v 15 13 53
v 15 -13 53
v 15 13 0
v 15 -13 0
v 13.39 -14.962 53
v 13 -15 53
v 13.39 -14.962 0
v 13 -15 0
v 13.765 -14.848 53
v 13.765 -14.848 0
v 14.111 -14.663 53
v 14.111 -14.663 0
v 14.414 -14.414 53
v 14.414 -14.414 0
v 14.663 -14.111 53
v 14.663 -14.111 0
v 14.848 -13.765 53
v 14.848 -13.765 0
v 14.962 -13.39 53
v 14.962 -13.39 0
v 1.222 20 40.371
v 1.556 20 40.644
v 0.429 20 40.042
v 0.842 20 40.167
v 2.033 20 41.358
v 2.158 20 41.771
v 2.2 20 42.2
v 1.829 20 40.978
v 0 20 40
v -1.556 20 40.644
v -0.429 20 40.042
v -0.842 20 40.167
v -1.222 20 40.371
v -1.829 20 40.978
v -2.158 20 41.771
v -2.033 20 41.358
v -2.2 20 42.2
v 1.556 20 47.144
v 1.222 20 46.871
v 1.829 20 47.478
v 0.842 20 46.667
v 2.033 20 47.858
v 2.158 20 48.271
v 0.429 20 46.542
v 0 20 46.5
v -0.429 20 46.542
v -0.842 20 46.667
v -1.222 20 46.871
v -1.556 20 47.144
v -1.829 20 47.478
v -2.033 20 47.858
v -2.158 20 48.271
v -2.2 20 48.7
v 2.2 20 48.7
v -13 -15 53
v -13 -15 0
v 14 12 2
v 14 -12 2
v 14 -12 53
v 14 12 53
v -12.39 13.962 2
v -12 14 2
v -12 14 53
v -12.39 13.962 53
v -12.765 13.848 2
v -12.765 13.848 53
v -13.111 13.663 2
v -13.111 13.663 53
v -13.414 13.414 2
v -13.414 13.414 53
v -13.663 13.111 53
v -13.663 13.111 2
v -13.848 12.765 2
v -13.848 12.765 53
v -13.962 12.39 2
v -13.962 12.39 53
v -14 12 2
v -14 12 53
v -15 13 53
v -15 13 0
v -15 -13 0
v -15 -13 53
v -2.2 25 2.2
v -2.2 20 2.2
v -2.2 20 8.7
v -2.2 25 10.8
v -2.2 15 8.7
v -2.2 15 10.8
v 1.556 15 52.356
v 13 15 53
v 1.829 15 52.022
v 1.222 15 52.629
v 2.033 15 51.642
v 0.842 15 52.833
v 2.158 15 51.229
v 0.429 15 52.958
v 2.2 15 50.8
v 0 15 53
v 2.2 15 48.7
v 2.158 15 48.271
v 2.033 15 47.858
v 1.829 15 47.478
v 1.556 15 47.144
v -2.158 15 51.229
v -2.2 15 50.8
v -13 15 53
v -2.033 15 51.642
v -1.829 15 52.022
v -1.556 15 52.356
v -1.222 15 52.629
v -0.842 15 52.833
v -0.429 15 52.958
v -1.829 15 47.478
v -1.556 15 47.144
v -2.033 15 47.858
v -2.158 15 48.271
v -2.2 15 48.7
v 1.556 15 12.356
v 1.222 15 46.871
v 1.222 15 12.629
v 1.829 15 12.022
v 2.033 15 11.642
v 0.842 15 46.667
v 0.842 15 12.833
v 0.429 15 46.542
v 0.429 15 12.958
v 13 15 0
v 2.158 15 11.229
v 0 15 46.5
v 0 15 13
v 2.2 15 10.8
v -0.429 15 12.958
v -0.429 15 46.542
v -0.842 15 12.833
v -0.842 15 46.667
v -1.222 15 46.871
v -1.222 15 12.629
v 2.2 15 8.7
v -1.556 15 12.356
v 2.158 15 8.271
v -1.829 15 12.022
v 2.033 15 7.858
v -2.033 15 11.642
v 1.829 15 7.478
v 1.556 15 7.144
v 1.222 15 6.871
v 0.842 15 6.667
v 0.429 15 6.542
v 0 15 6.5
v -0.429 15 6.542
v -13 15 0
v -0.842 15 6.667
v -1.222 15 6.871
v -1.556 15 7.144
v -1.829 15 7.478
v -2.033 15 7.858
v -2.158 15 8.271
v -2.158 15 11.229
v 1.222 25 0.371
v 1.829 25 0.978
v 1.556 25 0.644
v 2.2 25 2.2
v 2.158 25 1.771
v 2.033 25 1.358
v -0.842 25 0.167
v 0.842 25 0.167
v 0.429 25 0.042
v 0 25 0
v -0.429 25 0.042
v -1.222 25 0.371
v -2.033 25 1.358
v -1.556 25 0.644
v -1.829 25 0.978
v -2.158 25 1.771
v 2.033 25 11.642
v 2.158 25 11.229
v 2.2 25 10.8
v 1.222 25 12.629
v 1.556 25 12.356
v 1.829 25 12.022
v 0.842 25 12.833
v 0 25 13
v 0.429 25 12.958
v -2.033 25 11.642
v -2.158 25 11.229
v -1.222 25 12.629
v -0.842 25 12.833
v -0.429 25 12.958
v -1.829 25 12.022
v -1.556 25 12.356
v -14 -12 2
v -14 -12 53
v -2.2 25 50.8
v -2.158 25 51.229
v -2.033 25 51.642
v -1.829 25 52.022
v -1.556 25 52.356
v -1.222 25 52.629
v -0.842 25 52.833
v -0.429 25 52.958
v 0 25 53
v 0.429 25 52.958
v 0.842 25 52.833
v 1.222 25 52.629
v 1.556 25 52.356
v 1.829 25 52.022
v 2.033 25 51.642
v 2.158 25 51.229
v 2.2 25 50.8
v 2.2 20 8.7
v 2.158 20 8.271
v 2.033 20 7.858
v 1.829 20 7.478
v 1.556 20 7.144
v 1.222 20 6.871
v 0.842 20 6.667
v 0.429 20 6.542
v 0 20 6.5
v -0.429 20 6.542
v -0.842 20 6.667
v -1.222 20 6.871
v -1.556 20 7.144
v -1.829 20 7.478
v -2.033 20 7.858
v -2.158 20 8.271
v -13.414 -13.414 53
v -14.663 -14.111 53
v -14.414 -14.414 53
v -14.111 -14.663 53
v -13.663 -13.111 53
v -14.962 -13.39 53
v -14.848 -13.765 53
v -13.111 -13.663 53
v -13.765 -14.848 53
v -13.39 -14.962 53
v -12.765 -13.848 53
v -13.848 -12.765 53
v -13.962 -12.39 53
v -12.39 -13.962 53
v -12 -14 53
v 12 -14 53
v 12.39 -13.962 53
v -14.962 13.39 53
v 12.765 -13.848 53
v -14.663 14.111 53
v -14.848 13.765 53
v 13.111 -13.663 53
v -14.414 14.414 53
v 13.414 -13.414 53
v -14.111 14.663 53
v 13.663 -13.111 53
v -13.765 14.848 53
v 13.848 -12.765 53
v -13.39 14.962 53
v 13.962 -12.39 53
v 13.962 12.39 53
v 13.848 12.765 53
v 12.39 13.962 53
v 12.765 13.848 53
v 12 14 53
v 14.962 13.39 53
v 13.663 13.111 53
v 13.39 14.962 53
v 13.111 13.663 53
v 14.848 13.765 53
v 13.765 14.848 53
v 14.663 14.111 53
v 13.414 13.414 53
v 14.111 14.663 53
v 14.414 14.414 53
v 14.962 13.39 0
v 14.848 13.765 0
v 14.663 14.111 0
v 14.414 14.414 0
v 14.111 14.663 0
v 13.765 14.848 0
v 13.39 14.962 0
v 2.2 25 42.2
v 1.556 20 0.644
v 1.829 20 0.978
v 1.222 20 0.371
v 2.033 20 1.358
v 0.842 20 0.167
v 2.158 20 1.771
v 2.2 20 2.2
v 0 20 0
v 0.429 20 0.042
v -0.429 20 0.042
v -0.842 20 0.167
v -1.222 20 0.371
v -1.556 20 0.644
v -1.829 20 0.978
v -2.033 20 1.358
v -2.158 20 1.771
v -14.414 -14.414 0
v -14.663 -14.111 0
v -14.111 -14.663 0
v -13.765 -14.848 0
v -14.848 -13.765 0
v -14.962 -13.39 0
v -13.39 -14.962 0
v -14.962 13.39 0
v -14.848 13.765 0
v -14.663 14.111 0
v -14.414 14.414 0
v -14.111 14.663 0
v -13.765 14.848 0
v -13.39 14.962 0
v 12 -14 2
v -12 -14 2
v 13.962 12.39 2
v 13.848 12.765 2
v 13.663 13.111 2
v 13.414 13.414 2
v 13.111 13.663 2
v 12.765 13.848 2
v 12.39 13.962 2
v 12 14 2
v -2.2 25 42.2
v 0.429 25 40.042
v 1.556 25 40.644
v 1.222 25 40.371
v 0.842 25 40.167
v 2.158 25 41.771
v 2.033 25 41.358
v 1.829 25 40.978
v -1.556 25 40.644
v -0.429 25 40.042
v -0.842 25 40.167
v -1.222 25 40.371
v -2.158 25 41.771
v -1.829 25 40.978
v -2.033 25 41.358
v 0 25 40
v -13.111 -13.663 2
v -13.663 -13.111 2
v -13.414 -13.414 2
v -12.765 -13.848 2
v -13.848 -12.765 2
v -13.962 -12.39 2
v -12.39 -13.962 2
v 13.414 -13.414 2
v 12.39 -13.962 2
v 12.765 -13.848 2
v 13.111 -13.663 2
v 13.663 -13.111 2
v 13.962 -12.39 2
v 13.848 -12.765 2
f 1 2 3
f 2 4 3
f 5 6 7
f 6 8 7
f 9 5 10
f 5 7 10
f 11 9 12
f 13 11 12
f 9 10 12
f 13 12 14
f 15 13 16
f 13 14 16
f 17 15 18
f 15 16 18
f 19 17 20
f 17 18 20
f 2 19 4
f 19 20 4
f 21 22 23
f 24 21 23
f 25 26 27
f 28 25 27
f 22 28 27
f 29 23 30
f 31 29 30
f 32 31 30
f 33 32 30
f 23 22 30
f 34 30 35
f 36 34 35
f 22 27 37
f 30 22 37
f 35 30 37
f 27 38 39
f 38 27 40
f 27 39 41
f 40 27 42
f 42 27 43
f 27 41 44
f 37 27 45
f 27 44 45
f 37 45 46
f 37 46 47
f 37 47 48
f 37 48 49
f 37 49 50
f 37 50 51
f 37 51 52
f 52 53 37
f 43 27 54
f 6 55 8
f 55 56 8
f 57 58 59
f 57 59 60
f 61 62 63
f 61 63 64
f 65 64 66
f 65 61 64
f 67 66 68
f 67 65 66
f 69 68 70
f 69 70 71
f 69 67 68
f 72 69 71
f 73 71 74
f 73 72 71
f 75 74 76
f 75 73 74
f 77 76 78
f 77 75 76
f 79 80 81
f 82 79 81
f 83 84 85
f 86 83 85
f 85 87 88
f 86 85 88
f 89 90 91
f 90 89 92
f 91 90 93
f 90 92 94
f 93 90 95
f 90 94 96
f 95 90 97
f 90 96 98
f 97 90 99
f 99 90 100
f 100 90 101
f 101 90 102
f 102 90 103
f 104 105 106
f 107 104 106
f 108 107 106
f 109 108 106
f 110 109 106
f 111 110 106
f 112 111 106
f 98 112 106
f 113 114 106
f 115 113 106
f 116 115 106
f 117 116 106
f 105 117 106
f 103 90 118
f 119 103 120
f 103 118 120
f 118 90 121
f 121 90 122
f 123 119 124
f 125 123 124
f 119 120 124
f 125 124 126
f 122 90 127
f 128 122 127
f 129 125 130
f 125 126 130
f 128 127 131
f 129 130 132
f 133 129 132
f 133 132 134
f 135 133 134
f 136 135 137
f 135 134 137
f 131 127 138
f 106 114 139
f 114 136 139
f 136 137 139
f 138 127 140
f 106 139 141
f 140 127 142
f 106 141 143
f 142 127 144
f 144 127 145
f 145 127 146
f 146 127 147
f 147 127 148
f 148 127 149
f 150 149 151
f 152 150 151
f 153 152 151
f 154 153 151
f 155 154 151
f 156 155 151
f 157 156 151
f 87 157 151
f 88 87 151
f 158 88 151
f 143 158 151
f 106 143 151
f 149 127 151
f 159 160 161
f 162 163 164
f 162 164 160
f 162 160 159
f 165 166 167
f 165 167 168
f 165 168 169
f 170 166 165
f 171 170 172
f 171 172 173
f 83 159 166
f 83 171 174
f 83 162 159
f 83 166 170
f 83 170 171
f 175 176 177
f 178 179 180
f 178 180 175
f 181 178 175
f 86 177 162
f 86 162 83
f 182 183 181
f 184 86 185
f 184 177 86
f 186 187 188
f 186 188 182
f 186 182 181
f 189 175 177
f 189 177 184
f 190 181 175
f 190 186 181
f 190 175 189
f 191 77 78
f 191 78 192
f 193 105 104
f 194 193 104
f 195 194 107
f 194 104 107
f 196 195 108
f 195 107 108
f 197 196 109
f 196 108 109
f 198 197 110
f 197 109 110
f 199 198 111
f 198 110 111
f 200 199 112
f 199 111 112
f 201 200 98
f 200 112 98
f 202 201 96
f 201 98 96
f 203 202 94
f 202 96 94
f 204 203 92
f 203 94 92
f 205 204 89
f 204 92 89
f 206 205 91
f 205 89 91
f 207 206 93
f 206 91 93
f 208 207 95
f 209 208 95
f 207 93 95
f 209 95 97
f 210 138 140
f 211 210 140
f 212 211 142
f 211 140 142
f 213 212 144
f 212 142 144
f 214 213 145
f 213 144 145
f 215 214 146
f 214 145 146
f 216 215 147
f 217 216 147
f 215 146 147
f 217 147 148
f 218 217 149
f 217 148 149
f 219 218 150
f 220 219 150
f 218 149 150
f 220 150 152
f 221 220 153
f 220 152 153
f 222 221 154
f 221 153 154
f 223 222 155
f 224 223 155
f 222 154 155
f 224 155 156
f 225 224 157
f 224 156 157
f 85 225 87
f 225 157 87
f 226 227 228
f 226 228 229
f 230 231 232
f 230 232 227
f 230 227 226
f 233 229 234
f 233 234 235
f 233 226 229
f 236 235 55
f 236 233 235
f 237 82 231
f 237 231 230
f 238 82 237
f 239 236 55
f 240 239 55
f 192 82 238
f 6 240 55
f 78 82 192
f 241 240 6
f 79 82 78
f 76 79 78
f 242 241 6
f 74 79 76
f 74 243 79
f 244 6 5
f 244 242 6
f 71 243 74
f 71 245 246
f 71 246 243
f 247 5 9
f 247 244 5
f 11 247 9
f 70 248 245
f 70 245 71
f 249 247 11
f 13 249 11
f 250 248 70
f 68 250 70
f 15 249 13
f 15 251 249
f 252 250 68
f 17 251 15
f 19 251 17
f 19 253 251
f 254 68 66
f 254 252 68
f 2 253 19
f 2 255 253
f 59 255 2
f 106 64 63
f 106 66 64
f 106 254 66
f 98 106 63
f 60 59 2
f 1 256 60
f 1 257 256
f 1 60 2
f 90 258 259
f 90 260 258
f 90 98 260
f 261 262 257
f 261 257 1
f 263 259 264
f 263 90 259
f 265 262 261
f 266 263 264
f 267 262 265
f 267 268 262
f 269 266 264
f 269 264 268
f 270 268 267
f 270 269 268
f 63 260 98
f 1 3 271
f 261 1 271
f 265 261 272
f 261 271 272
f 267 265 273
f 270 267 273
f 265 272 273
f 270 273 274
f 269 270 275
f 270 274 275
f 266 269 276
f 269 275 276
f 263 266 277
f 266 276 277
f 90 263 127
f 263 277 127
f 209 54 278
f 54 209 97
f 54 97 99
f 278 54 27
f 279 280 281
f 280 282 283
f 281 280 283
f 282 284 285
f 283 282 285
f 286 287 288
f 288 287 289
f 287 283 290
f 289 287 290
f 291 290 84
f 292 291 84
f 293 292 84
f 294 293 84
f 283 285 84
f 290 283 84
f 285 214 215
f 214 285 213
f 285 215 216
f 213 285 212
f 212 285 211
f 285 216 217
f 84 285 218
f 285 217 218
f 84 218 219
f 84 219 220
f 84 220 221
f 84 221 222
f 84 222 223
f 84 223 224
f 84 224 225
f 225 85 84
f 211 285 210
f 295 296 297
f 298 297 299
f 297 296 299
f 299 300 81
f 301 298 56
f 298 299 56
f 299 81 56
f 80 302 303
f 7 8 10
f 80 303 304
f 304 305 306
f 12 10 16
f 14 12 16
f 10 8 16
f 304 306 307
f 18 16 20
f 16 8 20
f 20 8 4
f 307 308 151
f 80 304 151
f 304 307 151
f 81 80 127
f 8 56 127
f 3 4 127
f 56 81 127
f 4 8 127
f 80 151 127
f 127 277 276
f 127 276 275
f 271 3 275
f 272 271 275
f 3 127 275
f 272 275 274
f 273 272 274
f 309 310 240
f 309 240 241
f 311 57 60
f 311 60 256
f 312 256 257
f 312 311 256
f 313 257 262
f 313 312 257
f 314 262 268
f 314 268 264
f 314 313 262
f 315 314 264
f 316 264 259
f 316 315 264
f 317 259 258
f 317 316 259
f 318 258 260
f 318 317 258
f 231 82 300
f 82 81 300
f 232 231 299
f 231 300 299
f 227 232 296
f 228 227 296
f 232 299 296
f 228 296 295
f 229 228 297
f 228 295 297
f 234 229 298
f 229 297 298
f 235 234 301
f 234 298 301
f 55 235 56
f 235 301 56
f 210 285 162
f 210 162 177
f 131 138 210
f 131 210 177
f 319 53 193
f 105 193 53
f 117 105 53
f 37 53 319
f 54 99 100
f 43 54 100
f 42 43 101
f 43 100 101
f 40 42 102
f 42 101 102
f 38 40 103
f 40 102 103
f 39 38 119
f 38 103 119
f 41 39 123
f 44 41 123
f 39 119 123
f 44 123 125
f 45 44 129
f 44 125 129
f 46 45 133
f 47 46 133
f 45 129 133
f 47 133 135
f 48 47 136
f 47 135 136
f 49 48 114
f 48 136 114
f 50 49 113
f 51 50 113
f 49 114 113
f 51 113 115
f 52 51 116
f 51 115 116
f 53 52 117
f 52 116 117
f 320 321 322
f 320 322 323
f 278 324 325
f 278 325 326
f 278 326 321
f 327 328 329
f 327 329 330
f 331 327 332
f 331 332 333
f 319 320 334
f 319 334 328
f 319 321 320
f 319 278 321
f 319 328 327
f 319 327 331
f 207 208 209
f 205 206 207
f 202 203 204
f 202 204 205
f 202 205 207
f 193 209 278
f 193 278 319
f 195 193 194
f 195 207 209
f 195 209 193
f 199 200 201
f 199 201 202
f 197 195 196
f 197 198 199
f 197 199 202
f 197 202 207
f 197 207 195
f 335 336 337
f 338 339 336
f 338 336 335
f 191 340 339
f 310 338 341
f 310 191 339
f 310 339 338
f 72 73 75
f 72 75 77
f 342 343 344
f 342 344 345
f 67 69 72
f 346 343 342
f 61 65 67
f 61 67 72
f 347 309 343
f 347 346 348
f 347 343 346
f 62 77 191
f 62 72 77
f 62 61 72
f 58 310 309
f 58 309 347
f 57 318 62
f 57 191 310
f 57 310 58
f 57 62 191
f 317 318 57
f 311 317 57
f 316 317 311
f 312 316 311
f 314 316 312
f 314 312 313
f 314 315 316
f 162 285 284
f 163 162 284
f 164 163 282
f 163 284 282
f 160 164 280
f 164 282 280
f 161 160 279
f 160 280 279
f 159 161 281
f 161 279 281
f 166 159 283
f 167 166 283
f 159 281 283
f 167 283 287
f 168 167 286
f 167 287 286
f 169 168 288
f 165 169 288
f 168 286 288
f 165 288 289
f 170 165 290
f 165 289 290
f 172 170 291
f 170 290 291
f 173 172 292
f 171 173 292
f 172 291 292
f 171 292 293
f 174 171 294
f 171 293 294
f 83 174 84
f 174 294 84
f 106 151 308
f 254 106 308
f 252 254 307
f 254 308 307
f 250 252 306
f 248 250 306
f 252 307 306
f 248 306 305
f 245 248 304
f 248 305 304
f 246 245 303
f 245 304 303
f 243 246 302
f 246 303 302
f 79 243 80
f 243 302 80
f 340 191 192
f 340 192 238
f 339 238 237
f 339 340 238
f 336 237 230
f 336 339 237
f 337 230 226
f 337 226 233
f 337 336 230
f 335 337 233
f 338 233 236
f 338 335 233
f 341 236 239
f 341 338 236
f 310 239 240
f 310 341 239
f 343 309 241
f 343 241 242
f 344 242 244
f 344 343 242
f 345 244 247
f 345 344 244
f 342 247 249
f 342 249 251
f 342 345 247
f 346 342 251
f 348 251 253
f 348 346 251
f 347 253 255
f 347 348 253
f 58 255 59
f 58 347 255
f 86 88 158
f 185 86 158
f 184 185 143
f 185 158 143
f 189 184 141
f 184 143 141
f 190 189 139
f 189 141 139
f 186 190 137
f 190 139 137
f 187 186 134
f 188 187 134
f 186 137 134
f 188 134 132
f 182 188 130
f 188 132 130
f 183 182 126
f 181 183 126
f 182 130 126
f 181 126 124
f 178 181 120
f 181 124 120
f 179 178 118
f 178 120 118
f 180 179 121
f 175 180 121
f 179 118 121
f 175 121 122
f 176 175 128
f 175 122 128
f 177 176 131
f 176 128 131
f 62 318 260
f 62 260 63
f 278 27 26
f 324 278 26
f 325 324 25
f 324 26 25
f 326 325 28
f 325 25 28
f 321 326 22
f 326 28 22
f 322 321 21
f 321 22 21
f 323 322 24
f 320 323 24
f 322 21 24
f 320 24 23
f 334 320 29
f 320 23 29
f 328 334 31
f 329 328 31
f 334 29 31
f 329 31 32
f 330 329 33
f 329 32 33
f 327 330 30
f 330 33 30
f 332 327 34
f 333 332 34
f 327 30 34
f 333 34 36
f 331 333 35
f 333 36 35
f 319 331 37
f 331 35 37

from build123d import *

# Parameters (mm, degrees)
PAD_DEPTH    = 2
PAD001_DEPTH = 51
PAD002_DEPTH = 5
PAD003_DEPTH = 5


with BuildPart() as part:
    # Sketch → Pad (new body)
    with BuildSketch(Plane.XY):
        with BuildLine():
            Line((-15, 13), (-15, -13))
            ThreePointArc((-15, -13), (-14.414214, -14.414214), (-13, -15))
            Line((-13, -15), (13, -15))
            ThreePointArc((13, -15), (14.414214, -14.414214), (15, -13))
            Line((15, -13), (15, 13))
            ThreePointArc((15, 13), (14.414214, 14.414214), (13, 15))
            Line((13, 15), (-13, 15))
            ThreePointArc((-13, 15), (-14.414214, 14.414214), (-15, 13))
        make_face()
    extrude(amount=PAD_DEPTH)

    # Sketch001 (on Face10 of Pad) → Pad001 (join)
    with BuildSketch(Plane.XY.offset(2)):
        with BuildLine():
            Line((-15, 13), (-15, -13))
            ThreePointArc((-15, -13), (-14.414214, -14.414214), (-13, -15))
            Line((-13, -15), (13, -15))
            ThreePointArc((13, -15), (14.414214, -14.414214), (15, -13))
            Line((15, -13), (15, 13))
            ThreePointArc((15, 13), (14.414214, 14.414214), (13, 15))
            Line((13, 15), (-13, 15))
            ThreePointArc((-13, 15), (-14.414214, 14.414214), (-15, 13))
        make_face()
        with BuildLine():
            Line((-14, 12), (-14, -12))
            ThreePointArc((-14, -12), (-13.414214, -13.414214), (-12, -14))
            Line((-12, -14), (12, -14))
            ThreePointArc((12, -14), (13.414214, -13.414214), (14, -12))
            Line((14, -12), (14, 12))
            ThreePointArc((14, 12), (13.414214, 13.414214), (12, 14))
            Line((12, 14), (-12, 14))
            ThreePointArc((-12, 14), (-13.414214, 13.414214), (-14, 12))
        make_face(mode=Mode.SUBTRACT)
    extrude(amount=PAD001_DEPTH)

    # Sketch002 (on Face13 of Pad001) → Pad002 (join)
    with BuildSketch(Plane(origin=(0, 15, 0), x_dir=(-1, 0, 0), z_dir=(0, 1, 0))):
        with BuildLine():
            ThreePointArc((2.2, 50.8), (0, 53), (-2.2, 50.8))
            Line((-2.2, 50.8), (-2.2, 48.7))
            ThreePointArc((-2.2, 48.7), (0, 46.5), (2.2, 48.7))
            Line((2.2, 50.8), (2.2, 48.7))
        make_face()
        with BuildLine():
            ThreePointArc((-2.2, 8.7), (0, 6.5), (2.2, 8.7))
            Line((2.2, 8.7), (2.2, 10.8))
            ThreePointArc((2.2, 10.8), (0, 13), (-2.2, 10.8))
            Line((-2.2, 8.7), (-2.2, 10.8))
        make_face()
    extrude(amount=PAD002_DEPTH)

    # Sketch003 (on Face28 of Pad002) → Pad003 (join)
    with BuildSketch(Plane(origin=(0, 20, 0), x_dir=(-1, 0, 0), z_dir=(0, 1, 0))):
        with BuildLine():
            ThreePointArc((2.2, 50.8), (0, 53), (-2.2, 50.8))
            Line((-2.2, 50.8), (-2.2, 42.2))
            ThreePointArc((-2.2, 42.2), (0, 40), (2.2, 42.2))
            Line((2.2, 50.8), (2.2, 42.2))
        make_face()
        with BuildLine():
            ThreePointArc((2.2, 10.8), (0, 13), (-2.2, 10.8))
            Line((-2.2, 10.8), (-2.2, 2.2))
            ThreePointArc((-2.2, 2.2), (0, 0), (2.2, 2.2))
            Line((2.2, 10.8), (2.2, 2.2))
        make_face()
    extrude(amount=PAD003_DEPTH)


solid = part.part
